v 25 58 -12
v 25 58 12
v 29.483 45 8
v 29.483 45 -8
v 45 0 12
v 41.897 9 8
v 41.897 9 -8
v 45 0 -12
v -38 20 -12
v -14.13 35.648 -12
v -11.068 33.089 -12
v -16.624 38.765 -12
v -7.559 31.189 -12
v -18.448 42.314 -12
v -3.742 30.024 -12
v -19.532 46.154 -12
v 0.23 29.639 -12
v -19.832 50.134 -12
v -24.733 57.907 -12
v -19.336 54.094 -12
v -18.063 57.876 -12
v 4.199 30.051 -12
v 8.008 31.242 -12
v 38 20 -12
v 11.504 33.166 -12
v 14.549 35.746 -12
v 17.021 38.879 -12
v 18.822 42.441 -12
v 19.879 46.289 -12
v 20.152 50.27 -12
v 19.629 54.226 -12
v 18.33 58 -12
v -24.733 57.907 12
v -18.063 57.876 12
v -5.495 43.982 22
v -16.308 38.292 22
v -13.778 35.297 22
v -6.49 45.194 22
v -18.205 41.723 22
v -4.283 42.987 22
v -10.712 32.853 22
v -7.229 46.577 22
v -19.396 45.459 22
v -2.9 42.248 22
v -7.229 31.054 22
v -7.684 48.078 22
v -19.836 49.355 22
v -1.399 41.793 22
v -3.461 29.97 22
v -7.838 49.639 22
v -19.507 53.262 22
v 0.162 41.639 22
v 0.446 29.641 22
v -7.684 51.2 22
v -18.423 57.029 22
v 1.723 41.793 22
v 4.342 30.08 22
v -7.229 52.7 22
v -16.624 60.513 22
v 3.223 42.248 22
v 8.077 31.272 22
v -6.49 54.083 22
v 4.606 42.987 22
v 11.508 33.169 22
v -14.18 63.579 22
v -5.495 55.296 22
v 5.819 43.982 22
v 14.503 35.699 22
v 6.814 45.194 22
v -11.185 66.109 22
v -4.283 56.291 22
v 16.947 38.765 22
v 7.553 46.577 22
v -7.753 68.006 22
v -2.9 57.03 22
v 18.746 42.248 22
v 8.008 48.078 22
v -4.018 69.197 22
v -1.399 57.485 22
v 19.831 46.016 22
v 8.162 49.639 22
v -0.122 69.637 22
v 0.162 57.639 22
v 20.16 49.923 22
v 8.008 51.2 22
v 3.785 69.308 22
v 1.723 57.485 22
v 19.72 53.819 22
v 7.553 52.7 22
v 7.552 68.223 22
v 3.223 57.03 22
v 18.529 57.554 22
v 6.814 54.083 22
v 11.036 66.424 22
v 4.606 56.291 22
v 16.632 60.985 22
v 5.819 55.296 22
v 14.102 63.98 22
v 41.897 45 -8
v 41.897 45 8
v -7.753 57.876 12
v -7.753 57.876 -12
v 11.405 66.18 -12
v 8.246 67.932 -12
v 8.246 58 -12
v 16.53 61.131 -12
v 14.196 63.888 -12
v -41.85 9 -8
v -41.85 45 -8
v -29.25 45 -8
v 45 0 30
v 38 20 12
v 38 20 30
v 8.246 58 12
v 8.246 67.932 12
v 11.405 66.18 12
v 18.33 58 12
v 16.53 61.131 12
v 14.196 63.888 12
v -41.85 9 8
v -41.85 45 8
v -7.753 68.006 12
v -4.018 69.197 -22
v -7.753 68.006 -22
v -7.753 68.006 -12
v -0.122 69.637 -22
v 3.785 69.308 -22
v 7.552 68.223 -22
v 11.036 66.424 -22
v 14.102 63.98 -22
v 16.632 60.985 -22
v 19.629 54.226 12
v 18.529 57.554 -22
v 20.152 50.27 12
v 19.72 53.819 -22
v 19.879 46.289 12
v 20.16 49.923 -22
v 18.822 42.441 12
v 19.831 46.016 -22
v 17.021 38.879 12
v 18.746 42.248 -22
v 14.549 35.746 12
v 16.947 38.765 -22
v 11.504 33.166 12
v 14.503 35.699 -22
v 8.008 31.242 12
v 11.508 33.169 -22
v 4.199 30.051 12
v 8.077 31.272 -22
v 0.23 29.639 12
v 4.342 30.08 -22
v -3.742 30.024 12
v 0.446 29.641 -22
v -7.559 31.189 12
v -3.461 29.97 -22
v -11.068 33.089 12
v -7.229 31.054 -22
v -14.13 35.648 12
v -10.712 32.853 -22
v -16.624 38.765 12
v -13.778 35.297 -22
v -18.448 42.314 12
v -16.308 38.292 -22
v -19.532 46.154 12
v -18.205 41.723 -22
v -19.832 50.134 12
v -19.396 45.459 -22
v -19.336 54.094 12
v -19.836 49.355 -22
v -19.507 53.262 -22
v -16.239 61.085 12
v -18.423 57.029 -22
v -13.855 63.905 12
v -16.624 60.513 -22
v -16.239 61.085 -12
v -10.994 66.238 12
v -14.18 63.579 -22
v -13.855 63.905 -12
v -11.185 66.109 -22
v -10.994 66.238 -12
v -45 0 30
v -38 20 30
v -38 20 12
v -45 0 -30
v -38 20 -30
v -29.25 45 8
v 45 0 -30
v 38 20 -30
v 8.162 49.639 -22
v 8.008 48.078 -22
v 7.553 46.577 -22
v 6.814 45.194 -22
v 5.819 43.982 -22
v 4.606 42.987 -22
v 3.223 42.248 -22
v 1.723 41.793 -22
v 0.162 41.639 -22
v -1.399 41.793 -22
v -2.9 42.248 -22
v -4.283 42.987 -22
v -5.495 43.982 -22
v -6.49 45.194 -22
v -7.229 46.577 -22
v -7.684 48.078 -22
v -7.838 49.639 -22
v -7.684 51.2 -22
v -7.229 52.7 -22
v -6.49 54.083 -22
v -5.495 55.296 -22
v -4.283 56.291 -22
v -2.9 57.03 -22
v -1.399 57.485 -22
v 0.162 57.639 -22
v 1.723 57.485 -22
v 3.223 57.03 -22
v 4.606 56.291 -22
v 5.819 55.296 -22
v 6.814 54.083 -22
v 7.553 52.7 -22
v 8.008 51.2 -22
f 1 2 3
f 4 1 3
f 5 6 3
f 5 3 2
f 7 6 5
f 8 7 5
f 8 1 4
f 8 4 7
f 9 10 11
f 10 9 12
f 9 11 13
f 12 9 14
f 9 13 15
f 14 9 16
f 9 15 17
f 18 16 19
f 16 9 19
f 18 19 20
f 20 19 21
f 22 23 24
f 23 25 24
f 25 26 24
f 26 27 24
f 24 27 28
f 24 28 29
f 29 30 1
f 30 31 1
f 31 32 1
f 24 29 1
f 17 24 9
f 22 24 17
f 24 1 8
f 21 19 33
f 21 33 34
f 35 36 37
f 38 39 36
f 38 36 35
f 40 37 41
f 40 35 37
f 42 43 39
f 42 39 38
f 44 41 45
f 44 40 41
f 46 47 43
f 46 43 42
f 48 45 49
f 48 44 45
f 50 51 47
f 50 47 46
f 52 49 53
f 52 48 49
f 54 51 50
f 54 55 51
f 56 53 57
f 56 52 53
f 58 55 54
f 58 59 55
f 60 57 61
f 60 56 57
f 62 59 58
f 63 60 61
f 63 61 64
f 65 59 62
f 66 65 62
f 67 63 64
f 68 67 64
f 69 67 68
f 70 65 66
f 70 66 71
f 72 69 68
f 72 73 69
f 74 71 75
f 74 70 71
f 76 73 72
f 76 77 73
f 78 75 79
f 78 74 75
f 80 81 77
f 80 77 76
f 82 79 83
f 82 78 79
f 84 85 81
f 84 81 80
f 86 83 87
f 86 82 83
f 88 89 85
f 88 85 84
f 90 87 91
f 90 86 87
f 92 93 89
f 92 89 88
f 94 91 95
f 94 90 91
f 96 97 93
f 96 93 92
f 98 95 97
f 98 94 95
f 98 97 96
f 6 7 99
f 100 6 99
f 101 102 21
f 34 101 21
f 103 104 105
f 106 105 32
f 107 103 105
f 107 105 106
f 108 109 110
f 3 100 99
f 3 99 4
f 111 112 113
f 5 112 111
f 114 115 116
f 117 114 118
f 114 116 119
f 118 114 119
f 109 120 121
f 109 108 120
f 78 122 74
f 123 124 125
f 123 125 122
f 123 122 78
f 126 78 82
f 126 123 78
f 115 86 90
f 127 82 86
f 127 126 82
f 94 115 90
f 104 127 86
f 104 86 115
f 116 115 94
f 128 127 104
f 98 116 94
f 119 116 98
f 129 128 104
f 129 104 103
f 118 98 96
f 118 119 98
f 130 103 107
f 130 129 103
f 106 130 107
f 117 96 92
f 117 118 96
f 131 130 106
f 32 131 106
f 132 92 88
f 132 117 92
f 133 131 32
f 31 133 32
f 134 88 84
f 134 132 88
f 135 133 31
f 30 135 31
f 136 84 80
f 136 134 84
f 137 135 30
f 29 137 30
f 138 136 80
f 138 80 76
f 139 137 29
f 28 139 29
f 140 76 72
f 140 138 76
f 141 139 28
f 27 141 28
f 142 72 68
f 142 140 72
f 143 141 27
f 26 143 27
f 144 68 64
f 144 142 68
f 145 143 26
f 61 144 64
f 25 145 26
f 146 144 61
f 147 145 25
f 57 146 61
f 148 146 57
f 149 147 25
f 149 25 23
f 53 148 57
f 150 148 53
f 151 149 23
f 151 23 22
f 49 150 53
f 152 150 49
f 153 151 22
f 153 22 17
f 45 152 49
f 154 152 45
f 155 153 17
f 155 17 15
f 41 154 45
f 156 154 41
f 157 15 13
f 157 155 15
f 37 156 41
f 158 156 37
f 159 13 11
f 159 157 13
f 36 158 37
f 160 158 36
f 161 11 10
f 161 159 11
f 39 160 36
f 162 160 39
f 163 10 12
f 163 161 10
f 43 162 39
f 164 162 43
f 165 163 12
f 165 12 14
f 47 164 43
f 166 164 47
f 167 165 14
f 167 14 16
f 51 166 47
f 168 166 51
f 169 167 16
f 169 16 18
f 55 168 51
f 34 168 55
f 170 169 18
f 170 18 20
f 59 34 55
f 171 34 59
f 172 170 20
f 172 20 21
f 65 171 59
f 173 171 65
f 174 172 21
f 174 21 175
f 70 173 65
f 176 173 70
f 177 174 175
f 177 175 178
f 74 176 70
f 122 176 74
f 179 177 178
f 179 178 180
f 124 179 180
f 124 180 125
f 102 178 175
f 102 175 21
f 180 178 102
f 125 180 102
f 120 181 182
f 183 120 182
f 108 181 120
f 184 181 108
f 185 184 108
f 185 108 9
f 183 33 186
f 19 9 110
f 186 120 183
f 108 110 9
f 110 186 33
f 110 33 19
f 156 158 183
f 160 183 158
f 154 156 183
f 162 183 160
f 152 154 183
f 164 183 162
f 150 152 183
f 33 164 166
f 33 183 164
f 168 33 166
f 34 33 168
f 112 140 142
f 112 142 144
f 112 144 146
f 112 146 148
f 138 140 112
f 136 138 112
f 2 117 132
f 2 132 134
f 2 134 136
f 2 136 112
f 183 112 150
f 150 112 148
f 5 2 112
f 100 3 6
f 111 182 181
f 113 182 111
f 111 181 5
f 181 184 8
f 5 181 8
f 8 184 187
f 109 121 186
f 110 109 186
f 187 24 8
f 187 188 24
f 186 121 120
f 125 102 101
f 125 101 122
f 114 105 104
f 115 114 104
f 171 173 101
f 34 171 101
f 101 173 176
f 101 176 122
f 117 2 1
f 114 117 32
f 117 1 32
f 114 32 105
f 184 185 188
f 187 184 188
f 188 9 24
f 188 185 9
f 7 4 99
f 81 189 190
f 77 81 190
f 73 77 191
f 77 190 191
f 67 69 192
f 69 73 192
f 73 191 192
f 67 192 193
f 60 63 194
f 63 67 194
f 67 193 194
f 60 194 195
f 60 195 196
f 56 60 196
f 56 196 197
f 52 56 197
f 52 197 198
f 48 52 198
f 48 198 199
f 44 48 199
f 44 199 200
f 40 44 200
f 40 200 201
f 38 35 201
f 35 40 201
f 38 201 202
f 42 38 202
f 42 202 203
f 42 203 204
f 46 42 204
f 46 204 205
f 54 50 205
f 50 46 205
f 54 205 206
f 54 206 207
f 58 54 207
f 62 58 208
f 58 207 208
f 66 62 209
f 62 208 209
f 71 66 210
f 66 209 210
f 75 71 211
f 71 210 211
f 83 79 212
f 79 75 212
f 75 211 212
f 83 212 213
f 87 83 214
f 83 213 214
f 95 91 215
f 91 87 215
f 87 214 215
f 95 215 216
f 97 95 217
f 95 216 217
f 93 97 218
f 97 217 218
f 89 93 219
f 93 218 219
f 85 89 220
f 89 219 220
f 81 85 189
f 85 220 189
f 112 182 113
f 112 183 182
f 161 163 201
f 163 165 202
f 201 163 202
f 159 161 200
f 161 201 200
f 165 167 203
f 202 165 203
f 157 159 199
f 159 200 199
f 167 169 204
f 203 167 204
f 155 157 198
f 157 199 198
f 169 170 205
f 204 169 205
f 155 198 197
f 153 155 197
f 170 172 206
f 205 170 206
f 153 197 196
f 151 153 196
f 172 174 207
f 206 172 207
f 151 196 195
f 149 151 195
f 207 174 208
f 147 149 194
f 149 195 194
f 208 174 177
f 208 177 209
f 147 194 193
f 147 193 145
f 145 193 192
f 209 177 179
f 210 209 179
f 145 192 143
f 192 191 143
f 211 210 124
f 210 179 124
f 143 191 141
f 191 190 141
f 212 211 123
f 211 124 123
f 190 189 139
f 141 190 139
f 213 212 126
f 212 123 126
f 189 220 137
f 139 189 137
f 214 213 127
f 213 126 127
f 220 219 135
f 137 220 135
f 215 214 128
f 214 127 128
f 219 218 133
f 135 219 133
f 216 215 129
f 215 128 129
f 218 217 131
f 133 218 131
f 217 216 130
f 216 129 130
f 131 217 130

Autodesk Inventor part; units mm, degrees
ref_plane "YZ Plane" through (0, 0, 0) normal (1, 0, 0) x (0, 1, 0)
ref_plane "XZ Plane" through (0, 0, 0) normal (0, 1, 0) x (-1, 0, 0)
ref_plane "XY Plane" through (0, 0, 0) normal (0, 0, 1) x (1, 0, 0)
sketch "Sketch1" plane through (0, 0, 0) normal (0, 0, 1) x (1, 0, 0)
  line L0 (-45, 0) -> (45, 0)
  circle A0 centre (0.1619, 49.6388) radius 8
  circle A1 centre (0.1619, 49.6388) radius 20
  line L1 (-7.7534, 57.876) -> (-7.7534, 68.0058)
  line L2 (-7.7534, 57.876) -> (-18.063, 57.876)
  line L3 (8.2464, 58) -> (18.3303, 58)
  line L4 (8.2464, 58) -> (8.2464, 67.932)
  line L5 (25, 58) -> (18.3303, 58)
  line L6 (-24.7326, 57.9068) -> (-18.063, 57.876)
  line L7 (45, 0) -> (-45, 0)
  line L8 (-41.85, 9) -> (-41.85, 45)
  line L9 (-41.85, 45) -> (-29.25, 45)
  line L10 (41.8966, 9) -> (41.8966, 45)
  line L11 (41.8966, 45) -> (29.4828, 45)
  line L12 (-38, 20) -> (38, 20)
  line L13 (-45, 0) -> (-24.7326, 57.9068)
  line L14 (25, 58) -> (45, 0)
  line L15 (-45, 0) -> (-38, 20)
  line L16 (38, 20) -> (45, 0)
  point P0 (0, 0)
extrude "Extrusion1" add sketch "Sketch1" along normal mid plane 44 contours A1 L2 L1 L4 L3
extrude "Extrusion2" add sketch "Sketch1" along normal mid plane 44 contours L3 L4 A1
extrude "Extrusion3" add sketch "Sketch1" along normal mid plane 44 contours A1 L1 L2
extrude "Extrusion4" cut sketch "Sketch1" along normal mid plane 24 contours A1 L1 L2
extrude "Extrusion5" cut sketch "Sketch1" along normal mid plane 24 contours L3 L4 A1
extrude "Extrusion6" add sketch "Sketch1" along normal mid plane 16 contours L14 L11 L10
extrude "Extrusion7" add sketch "Sketch1" along normal mid plane 16 contours L8 L9 L13
extrude "Extrusion8" add sketch "Sketch1" along normal mid plane 24 contours L16 L12 L13 L6 A1 L5 L14
extrude "Extrusion9" add sketch "Sketch1" along normal mid plane 60 contours L13 L12 L16 L0
properties part number "Q2 auto"
